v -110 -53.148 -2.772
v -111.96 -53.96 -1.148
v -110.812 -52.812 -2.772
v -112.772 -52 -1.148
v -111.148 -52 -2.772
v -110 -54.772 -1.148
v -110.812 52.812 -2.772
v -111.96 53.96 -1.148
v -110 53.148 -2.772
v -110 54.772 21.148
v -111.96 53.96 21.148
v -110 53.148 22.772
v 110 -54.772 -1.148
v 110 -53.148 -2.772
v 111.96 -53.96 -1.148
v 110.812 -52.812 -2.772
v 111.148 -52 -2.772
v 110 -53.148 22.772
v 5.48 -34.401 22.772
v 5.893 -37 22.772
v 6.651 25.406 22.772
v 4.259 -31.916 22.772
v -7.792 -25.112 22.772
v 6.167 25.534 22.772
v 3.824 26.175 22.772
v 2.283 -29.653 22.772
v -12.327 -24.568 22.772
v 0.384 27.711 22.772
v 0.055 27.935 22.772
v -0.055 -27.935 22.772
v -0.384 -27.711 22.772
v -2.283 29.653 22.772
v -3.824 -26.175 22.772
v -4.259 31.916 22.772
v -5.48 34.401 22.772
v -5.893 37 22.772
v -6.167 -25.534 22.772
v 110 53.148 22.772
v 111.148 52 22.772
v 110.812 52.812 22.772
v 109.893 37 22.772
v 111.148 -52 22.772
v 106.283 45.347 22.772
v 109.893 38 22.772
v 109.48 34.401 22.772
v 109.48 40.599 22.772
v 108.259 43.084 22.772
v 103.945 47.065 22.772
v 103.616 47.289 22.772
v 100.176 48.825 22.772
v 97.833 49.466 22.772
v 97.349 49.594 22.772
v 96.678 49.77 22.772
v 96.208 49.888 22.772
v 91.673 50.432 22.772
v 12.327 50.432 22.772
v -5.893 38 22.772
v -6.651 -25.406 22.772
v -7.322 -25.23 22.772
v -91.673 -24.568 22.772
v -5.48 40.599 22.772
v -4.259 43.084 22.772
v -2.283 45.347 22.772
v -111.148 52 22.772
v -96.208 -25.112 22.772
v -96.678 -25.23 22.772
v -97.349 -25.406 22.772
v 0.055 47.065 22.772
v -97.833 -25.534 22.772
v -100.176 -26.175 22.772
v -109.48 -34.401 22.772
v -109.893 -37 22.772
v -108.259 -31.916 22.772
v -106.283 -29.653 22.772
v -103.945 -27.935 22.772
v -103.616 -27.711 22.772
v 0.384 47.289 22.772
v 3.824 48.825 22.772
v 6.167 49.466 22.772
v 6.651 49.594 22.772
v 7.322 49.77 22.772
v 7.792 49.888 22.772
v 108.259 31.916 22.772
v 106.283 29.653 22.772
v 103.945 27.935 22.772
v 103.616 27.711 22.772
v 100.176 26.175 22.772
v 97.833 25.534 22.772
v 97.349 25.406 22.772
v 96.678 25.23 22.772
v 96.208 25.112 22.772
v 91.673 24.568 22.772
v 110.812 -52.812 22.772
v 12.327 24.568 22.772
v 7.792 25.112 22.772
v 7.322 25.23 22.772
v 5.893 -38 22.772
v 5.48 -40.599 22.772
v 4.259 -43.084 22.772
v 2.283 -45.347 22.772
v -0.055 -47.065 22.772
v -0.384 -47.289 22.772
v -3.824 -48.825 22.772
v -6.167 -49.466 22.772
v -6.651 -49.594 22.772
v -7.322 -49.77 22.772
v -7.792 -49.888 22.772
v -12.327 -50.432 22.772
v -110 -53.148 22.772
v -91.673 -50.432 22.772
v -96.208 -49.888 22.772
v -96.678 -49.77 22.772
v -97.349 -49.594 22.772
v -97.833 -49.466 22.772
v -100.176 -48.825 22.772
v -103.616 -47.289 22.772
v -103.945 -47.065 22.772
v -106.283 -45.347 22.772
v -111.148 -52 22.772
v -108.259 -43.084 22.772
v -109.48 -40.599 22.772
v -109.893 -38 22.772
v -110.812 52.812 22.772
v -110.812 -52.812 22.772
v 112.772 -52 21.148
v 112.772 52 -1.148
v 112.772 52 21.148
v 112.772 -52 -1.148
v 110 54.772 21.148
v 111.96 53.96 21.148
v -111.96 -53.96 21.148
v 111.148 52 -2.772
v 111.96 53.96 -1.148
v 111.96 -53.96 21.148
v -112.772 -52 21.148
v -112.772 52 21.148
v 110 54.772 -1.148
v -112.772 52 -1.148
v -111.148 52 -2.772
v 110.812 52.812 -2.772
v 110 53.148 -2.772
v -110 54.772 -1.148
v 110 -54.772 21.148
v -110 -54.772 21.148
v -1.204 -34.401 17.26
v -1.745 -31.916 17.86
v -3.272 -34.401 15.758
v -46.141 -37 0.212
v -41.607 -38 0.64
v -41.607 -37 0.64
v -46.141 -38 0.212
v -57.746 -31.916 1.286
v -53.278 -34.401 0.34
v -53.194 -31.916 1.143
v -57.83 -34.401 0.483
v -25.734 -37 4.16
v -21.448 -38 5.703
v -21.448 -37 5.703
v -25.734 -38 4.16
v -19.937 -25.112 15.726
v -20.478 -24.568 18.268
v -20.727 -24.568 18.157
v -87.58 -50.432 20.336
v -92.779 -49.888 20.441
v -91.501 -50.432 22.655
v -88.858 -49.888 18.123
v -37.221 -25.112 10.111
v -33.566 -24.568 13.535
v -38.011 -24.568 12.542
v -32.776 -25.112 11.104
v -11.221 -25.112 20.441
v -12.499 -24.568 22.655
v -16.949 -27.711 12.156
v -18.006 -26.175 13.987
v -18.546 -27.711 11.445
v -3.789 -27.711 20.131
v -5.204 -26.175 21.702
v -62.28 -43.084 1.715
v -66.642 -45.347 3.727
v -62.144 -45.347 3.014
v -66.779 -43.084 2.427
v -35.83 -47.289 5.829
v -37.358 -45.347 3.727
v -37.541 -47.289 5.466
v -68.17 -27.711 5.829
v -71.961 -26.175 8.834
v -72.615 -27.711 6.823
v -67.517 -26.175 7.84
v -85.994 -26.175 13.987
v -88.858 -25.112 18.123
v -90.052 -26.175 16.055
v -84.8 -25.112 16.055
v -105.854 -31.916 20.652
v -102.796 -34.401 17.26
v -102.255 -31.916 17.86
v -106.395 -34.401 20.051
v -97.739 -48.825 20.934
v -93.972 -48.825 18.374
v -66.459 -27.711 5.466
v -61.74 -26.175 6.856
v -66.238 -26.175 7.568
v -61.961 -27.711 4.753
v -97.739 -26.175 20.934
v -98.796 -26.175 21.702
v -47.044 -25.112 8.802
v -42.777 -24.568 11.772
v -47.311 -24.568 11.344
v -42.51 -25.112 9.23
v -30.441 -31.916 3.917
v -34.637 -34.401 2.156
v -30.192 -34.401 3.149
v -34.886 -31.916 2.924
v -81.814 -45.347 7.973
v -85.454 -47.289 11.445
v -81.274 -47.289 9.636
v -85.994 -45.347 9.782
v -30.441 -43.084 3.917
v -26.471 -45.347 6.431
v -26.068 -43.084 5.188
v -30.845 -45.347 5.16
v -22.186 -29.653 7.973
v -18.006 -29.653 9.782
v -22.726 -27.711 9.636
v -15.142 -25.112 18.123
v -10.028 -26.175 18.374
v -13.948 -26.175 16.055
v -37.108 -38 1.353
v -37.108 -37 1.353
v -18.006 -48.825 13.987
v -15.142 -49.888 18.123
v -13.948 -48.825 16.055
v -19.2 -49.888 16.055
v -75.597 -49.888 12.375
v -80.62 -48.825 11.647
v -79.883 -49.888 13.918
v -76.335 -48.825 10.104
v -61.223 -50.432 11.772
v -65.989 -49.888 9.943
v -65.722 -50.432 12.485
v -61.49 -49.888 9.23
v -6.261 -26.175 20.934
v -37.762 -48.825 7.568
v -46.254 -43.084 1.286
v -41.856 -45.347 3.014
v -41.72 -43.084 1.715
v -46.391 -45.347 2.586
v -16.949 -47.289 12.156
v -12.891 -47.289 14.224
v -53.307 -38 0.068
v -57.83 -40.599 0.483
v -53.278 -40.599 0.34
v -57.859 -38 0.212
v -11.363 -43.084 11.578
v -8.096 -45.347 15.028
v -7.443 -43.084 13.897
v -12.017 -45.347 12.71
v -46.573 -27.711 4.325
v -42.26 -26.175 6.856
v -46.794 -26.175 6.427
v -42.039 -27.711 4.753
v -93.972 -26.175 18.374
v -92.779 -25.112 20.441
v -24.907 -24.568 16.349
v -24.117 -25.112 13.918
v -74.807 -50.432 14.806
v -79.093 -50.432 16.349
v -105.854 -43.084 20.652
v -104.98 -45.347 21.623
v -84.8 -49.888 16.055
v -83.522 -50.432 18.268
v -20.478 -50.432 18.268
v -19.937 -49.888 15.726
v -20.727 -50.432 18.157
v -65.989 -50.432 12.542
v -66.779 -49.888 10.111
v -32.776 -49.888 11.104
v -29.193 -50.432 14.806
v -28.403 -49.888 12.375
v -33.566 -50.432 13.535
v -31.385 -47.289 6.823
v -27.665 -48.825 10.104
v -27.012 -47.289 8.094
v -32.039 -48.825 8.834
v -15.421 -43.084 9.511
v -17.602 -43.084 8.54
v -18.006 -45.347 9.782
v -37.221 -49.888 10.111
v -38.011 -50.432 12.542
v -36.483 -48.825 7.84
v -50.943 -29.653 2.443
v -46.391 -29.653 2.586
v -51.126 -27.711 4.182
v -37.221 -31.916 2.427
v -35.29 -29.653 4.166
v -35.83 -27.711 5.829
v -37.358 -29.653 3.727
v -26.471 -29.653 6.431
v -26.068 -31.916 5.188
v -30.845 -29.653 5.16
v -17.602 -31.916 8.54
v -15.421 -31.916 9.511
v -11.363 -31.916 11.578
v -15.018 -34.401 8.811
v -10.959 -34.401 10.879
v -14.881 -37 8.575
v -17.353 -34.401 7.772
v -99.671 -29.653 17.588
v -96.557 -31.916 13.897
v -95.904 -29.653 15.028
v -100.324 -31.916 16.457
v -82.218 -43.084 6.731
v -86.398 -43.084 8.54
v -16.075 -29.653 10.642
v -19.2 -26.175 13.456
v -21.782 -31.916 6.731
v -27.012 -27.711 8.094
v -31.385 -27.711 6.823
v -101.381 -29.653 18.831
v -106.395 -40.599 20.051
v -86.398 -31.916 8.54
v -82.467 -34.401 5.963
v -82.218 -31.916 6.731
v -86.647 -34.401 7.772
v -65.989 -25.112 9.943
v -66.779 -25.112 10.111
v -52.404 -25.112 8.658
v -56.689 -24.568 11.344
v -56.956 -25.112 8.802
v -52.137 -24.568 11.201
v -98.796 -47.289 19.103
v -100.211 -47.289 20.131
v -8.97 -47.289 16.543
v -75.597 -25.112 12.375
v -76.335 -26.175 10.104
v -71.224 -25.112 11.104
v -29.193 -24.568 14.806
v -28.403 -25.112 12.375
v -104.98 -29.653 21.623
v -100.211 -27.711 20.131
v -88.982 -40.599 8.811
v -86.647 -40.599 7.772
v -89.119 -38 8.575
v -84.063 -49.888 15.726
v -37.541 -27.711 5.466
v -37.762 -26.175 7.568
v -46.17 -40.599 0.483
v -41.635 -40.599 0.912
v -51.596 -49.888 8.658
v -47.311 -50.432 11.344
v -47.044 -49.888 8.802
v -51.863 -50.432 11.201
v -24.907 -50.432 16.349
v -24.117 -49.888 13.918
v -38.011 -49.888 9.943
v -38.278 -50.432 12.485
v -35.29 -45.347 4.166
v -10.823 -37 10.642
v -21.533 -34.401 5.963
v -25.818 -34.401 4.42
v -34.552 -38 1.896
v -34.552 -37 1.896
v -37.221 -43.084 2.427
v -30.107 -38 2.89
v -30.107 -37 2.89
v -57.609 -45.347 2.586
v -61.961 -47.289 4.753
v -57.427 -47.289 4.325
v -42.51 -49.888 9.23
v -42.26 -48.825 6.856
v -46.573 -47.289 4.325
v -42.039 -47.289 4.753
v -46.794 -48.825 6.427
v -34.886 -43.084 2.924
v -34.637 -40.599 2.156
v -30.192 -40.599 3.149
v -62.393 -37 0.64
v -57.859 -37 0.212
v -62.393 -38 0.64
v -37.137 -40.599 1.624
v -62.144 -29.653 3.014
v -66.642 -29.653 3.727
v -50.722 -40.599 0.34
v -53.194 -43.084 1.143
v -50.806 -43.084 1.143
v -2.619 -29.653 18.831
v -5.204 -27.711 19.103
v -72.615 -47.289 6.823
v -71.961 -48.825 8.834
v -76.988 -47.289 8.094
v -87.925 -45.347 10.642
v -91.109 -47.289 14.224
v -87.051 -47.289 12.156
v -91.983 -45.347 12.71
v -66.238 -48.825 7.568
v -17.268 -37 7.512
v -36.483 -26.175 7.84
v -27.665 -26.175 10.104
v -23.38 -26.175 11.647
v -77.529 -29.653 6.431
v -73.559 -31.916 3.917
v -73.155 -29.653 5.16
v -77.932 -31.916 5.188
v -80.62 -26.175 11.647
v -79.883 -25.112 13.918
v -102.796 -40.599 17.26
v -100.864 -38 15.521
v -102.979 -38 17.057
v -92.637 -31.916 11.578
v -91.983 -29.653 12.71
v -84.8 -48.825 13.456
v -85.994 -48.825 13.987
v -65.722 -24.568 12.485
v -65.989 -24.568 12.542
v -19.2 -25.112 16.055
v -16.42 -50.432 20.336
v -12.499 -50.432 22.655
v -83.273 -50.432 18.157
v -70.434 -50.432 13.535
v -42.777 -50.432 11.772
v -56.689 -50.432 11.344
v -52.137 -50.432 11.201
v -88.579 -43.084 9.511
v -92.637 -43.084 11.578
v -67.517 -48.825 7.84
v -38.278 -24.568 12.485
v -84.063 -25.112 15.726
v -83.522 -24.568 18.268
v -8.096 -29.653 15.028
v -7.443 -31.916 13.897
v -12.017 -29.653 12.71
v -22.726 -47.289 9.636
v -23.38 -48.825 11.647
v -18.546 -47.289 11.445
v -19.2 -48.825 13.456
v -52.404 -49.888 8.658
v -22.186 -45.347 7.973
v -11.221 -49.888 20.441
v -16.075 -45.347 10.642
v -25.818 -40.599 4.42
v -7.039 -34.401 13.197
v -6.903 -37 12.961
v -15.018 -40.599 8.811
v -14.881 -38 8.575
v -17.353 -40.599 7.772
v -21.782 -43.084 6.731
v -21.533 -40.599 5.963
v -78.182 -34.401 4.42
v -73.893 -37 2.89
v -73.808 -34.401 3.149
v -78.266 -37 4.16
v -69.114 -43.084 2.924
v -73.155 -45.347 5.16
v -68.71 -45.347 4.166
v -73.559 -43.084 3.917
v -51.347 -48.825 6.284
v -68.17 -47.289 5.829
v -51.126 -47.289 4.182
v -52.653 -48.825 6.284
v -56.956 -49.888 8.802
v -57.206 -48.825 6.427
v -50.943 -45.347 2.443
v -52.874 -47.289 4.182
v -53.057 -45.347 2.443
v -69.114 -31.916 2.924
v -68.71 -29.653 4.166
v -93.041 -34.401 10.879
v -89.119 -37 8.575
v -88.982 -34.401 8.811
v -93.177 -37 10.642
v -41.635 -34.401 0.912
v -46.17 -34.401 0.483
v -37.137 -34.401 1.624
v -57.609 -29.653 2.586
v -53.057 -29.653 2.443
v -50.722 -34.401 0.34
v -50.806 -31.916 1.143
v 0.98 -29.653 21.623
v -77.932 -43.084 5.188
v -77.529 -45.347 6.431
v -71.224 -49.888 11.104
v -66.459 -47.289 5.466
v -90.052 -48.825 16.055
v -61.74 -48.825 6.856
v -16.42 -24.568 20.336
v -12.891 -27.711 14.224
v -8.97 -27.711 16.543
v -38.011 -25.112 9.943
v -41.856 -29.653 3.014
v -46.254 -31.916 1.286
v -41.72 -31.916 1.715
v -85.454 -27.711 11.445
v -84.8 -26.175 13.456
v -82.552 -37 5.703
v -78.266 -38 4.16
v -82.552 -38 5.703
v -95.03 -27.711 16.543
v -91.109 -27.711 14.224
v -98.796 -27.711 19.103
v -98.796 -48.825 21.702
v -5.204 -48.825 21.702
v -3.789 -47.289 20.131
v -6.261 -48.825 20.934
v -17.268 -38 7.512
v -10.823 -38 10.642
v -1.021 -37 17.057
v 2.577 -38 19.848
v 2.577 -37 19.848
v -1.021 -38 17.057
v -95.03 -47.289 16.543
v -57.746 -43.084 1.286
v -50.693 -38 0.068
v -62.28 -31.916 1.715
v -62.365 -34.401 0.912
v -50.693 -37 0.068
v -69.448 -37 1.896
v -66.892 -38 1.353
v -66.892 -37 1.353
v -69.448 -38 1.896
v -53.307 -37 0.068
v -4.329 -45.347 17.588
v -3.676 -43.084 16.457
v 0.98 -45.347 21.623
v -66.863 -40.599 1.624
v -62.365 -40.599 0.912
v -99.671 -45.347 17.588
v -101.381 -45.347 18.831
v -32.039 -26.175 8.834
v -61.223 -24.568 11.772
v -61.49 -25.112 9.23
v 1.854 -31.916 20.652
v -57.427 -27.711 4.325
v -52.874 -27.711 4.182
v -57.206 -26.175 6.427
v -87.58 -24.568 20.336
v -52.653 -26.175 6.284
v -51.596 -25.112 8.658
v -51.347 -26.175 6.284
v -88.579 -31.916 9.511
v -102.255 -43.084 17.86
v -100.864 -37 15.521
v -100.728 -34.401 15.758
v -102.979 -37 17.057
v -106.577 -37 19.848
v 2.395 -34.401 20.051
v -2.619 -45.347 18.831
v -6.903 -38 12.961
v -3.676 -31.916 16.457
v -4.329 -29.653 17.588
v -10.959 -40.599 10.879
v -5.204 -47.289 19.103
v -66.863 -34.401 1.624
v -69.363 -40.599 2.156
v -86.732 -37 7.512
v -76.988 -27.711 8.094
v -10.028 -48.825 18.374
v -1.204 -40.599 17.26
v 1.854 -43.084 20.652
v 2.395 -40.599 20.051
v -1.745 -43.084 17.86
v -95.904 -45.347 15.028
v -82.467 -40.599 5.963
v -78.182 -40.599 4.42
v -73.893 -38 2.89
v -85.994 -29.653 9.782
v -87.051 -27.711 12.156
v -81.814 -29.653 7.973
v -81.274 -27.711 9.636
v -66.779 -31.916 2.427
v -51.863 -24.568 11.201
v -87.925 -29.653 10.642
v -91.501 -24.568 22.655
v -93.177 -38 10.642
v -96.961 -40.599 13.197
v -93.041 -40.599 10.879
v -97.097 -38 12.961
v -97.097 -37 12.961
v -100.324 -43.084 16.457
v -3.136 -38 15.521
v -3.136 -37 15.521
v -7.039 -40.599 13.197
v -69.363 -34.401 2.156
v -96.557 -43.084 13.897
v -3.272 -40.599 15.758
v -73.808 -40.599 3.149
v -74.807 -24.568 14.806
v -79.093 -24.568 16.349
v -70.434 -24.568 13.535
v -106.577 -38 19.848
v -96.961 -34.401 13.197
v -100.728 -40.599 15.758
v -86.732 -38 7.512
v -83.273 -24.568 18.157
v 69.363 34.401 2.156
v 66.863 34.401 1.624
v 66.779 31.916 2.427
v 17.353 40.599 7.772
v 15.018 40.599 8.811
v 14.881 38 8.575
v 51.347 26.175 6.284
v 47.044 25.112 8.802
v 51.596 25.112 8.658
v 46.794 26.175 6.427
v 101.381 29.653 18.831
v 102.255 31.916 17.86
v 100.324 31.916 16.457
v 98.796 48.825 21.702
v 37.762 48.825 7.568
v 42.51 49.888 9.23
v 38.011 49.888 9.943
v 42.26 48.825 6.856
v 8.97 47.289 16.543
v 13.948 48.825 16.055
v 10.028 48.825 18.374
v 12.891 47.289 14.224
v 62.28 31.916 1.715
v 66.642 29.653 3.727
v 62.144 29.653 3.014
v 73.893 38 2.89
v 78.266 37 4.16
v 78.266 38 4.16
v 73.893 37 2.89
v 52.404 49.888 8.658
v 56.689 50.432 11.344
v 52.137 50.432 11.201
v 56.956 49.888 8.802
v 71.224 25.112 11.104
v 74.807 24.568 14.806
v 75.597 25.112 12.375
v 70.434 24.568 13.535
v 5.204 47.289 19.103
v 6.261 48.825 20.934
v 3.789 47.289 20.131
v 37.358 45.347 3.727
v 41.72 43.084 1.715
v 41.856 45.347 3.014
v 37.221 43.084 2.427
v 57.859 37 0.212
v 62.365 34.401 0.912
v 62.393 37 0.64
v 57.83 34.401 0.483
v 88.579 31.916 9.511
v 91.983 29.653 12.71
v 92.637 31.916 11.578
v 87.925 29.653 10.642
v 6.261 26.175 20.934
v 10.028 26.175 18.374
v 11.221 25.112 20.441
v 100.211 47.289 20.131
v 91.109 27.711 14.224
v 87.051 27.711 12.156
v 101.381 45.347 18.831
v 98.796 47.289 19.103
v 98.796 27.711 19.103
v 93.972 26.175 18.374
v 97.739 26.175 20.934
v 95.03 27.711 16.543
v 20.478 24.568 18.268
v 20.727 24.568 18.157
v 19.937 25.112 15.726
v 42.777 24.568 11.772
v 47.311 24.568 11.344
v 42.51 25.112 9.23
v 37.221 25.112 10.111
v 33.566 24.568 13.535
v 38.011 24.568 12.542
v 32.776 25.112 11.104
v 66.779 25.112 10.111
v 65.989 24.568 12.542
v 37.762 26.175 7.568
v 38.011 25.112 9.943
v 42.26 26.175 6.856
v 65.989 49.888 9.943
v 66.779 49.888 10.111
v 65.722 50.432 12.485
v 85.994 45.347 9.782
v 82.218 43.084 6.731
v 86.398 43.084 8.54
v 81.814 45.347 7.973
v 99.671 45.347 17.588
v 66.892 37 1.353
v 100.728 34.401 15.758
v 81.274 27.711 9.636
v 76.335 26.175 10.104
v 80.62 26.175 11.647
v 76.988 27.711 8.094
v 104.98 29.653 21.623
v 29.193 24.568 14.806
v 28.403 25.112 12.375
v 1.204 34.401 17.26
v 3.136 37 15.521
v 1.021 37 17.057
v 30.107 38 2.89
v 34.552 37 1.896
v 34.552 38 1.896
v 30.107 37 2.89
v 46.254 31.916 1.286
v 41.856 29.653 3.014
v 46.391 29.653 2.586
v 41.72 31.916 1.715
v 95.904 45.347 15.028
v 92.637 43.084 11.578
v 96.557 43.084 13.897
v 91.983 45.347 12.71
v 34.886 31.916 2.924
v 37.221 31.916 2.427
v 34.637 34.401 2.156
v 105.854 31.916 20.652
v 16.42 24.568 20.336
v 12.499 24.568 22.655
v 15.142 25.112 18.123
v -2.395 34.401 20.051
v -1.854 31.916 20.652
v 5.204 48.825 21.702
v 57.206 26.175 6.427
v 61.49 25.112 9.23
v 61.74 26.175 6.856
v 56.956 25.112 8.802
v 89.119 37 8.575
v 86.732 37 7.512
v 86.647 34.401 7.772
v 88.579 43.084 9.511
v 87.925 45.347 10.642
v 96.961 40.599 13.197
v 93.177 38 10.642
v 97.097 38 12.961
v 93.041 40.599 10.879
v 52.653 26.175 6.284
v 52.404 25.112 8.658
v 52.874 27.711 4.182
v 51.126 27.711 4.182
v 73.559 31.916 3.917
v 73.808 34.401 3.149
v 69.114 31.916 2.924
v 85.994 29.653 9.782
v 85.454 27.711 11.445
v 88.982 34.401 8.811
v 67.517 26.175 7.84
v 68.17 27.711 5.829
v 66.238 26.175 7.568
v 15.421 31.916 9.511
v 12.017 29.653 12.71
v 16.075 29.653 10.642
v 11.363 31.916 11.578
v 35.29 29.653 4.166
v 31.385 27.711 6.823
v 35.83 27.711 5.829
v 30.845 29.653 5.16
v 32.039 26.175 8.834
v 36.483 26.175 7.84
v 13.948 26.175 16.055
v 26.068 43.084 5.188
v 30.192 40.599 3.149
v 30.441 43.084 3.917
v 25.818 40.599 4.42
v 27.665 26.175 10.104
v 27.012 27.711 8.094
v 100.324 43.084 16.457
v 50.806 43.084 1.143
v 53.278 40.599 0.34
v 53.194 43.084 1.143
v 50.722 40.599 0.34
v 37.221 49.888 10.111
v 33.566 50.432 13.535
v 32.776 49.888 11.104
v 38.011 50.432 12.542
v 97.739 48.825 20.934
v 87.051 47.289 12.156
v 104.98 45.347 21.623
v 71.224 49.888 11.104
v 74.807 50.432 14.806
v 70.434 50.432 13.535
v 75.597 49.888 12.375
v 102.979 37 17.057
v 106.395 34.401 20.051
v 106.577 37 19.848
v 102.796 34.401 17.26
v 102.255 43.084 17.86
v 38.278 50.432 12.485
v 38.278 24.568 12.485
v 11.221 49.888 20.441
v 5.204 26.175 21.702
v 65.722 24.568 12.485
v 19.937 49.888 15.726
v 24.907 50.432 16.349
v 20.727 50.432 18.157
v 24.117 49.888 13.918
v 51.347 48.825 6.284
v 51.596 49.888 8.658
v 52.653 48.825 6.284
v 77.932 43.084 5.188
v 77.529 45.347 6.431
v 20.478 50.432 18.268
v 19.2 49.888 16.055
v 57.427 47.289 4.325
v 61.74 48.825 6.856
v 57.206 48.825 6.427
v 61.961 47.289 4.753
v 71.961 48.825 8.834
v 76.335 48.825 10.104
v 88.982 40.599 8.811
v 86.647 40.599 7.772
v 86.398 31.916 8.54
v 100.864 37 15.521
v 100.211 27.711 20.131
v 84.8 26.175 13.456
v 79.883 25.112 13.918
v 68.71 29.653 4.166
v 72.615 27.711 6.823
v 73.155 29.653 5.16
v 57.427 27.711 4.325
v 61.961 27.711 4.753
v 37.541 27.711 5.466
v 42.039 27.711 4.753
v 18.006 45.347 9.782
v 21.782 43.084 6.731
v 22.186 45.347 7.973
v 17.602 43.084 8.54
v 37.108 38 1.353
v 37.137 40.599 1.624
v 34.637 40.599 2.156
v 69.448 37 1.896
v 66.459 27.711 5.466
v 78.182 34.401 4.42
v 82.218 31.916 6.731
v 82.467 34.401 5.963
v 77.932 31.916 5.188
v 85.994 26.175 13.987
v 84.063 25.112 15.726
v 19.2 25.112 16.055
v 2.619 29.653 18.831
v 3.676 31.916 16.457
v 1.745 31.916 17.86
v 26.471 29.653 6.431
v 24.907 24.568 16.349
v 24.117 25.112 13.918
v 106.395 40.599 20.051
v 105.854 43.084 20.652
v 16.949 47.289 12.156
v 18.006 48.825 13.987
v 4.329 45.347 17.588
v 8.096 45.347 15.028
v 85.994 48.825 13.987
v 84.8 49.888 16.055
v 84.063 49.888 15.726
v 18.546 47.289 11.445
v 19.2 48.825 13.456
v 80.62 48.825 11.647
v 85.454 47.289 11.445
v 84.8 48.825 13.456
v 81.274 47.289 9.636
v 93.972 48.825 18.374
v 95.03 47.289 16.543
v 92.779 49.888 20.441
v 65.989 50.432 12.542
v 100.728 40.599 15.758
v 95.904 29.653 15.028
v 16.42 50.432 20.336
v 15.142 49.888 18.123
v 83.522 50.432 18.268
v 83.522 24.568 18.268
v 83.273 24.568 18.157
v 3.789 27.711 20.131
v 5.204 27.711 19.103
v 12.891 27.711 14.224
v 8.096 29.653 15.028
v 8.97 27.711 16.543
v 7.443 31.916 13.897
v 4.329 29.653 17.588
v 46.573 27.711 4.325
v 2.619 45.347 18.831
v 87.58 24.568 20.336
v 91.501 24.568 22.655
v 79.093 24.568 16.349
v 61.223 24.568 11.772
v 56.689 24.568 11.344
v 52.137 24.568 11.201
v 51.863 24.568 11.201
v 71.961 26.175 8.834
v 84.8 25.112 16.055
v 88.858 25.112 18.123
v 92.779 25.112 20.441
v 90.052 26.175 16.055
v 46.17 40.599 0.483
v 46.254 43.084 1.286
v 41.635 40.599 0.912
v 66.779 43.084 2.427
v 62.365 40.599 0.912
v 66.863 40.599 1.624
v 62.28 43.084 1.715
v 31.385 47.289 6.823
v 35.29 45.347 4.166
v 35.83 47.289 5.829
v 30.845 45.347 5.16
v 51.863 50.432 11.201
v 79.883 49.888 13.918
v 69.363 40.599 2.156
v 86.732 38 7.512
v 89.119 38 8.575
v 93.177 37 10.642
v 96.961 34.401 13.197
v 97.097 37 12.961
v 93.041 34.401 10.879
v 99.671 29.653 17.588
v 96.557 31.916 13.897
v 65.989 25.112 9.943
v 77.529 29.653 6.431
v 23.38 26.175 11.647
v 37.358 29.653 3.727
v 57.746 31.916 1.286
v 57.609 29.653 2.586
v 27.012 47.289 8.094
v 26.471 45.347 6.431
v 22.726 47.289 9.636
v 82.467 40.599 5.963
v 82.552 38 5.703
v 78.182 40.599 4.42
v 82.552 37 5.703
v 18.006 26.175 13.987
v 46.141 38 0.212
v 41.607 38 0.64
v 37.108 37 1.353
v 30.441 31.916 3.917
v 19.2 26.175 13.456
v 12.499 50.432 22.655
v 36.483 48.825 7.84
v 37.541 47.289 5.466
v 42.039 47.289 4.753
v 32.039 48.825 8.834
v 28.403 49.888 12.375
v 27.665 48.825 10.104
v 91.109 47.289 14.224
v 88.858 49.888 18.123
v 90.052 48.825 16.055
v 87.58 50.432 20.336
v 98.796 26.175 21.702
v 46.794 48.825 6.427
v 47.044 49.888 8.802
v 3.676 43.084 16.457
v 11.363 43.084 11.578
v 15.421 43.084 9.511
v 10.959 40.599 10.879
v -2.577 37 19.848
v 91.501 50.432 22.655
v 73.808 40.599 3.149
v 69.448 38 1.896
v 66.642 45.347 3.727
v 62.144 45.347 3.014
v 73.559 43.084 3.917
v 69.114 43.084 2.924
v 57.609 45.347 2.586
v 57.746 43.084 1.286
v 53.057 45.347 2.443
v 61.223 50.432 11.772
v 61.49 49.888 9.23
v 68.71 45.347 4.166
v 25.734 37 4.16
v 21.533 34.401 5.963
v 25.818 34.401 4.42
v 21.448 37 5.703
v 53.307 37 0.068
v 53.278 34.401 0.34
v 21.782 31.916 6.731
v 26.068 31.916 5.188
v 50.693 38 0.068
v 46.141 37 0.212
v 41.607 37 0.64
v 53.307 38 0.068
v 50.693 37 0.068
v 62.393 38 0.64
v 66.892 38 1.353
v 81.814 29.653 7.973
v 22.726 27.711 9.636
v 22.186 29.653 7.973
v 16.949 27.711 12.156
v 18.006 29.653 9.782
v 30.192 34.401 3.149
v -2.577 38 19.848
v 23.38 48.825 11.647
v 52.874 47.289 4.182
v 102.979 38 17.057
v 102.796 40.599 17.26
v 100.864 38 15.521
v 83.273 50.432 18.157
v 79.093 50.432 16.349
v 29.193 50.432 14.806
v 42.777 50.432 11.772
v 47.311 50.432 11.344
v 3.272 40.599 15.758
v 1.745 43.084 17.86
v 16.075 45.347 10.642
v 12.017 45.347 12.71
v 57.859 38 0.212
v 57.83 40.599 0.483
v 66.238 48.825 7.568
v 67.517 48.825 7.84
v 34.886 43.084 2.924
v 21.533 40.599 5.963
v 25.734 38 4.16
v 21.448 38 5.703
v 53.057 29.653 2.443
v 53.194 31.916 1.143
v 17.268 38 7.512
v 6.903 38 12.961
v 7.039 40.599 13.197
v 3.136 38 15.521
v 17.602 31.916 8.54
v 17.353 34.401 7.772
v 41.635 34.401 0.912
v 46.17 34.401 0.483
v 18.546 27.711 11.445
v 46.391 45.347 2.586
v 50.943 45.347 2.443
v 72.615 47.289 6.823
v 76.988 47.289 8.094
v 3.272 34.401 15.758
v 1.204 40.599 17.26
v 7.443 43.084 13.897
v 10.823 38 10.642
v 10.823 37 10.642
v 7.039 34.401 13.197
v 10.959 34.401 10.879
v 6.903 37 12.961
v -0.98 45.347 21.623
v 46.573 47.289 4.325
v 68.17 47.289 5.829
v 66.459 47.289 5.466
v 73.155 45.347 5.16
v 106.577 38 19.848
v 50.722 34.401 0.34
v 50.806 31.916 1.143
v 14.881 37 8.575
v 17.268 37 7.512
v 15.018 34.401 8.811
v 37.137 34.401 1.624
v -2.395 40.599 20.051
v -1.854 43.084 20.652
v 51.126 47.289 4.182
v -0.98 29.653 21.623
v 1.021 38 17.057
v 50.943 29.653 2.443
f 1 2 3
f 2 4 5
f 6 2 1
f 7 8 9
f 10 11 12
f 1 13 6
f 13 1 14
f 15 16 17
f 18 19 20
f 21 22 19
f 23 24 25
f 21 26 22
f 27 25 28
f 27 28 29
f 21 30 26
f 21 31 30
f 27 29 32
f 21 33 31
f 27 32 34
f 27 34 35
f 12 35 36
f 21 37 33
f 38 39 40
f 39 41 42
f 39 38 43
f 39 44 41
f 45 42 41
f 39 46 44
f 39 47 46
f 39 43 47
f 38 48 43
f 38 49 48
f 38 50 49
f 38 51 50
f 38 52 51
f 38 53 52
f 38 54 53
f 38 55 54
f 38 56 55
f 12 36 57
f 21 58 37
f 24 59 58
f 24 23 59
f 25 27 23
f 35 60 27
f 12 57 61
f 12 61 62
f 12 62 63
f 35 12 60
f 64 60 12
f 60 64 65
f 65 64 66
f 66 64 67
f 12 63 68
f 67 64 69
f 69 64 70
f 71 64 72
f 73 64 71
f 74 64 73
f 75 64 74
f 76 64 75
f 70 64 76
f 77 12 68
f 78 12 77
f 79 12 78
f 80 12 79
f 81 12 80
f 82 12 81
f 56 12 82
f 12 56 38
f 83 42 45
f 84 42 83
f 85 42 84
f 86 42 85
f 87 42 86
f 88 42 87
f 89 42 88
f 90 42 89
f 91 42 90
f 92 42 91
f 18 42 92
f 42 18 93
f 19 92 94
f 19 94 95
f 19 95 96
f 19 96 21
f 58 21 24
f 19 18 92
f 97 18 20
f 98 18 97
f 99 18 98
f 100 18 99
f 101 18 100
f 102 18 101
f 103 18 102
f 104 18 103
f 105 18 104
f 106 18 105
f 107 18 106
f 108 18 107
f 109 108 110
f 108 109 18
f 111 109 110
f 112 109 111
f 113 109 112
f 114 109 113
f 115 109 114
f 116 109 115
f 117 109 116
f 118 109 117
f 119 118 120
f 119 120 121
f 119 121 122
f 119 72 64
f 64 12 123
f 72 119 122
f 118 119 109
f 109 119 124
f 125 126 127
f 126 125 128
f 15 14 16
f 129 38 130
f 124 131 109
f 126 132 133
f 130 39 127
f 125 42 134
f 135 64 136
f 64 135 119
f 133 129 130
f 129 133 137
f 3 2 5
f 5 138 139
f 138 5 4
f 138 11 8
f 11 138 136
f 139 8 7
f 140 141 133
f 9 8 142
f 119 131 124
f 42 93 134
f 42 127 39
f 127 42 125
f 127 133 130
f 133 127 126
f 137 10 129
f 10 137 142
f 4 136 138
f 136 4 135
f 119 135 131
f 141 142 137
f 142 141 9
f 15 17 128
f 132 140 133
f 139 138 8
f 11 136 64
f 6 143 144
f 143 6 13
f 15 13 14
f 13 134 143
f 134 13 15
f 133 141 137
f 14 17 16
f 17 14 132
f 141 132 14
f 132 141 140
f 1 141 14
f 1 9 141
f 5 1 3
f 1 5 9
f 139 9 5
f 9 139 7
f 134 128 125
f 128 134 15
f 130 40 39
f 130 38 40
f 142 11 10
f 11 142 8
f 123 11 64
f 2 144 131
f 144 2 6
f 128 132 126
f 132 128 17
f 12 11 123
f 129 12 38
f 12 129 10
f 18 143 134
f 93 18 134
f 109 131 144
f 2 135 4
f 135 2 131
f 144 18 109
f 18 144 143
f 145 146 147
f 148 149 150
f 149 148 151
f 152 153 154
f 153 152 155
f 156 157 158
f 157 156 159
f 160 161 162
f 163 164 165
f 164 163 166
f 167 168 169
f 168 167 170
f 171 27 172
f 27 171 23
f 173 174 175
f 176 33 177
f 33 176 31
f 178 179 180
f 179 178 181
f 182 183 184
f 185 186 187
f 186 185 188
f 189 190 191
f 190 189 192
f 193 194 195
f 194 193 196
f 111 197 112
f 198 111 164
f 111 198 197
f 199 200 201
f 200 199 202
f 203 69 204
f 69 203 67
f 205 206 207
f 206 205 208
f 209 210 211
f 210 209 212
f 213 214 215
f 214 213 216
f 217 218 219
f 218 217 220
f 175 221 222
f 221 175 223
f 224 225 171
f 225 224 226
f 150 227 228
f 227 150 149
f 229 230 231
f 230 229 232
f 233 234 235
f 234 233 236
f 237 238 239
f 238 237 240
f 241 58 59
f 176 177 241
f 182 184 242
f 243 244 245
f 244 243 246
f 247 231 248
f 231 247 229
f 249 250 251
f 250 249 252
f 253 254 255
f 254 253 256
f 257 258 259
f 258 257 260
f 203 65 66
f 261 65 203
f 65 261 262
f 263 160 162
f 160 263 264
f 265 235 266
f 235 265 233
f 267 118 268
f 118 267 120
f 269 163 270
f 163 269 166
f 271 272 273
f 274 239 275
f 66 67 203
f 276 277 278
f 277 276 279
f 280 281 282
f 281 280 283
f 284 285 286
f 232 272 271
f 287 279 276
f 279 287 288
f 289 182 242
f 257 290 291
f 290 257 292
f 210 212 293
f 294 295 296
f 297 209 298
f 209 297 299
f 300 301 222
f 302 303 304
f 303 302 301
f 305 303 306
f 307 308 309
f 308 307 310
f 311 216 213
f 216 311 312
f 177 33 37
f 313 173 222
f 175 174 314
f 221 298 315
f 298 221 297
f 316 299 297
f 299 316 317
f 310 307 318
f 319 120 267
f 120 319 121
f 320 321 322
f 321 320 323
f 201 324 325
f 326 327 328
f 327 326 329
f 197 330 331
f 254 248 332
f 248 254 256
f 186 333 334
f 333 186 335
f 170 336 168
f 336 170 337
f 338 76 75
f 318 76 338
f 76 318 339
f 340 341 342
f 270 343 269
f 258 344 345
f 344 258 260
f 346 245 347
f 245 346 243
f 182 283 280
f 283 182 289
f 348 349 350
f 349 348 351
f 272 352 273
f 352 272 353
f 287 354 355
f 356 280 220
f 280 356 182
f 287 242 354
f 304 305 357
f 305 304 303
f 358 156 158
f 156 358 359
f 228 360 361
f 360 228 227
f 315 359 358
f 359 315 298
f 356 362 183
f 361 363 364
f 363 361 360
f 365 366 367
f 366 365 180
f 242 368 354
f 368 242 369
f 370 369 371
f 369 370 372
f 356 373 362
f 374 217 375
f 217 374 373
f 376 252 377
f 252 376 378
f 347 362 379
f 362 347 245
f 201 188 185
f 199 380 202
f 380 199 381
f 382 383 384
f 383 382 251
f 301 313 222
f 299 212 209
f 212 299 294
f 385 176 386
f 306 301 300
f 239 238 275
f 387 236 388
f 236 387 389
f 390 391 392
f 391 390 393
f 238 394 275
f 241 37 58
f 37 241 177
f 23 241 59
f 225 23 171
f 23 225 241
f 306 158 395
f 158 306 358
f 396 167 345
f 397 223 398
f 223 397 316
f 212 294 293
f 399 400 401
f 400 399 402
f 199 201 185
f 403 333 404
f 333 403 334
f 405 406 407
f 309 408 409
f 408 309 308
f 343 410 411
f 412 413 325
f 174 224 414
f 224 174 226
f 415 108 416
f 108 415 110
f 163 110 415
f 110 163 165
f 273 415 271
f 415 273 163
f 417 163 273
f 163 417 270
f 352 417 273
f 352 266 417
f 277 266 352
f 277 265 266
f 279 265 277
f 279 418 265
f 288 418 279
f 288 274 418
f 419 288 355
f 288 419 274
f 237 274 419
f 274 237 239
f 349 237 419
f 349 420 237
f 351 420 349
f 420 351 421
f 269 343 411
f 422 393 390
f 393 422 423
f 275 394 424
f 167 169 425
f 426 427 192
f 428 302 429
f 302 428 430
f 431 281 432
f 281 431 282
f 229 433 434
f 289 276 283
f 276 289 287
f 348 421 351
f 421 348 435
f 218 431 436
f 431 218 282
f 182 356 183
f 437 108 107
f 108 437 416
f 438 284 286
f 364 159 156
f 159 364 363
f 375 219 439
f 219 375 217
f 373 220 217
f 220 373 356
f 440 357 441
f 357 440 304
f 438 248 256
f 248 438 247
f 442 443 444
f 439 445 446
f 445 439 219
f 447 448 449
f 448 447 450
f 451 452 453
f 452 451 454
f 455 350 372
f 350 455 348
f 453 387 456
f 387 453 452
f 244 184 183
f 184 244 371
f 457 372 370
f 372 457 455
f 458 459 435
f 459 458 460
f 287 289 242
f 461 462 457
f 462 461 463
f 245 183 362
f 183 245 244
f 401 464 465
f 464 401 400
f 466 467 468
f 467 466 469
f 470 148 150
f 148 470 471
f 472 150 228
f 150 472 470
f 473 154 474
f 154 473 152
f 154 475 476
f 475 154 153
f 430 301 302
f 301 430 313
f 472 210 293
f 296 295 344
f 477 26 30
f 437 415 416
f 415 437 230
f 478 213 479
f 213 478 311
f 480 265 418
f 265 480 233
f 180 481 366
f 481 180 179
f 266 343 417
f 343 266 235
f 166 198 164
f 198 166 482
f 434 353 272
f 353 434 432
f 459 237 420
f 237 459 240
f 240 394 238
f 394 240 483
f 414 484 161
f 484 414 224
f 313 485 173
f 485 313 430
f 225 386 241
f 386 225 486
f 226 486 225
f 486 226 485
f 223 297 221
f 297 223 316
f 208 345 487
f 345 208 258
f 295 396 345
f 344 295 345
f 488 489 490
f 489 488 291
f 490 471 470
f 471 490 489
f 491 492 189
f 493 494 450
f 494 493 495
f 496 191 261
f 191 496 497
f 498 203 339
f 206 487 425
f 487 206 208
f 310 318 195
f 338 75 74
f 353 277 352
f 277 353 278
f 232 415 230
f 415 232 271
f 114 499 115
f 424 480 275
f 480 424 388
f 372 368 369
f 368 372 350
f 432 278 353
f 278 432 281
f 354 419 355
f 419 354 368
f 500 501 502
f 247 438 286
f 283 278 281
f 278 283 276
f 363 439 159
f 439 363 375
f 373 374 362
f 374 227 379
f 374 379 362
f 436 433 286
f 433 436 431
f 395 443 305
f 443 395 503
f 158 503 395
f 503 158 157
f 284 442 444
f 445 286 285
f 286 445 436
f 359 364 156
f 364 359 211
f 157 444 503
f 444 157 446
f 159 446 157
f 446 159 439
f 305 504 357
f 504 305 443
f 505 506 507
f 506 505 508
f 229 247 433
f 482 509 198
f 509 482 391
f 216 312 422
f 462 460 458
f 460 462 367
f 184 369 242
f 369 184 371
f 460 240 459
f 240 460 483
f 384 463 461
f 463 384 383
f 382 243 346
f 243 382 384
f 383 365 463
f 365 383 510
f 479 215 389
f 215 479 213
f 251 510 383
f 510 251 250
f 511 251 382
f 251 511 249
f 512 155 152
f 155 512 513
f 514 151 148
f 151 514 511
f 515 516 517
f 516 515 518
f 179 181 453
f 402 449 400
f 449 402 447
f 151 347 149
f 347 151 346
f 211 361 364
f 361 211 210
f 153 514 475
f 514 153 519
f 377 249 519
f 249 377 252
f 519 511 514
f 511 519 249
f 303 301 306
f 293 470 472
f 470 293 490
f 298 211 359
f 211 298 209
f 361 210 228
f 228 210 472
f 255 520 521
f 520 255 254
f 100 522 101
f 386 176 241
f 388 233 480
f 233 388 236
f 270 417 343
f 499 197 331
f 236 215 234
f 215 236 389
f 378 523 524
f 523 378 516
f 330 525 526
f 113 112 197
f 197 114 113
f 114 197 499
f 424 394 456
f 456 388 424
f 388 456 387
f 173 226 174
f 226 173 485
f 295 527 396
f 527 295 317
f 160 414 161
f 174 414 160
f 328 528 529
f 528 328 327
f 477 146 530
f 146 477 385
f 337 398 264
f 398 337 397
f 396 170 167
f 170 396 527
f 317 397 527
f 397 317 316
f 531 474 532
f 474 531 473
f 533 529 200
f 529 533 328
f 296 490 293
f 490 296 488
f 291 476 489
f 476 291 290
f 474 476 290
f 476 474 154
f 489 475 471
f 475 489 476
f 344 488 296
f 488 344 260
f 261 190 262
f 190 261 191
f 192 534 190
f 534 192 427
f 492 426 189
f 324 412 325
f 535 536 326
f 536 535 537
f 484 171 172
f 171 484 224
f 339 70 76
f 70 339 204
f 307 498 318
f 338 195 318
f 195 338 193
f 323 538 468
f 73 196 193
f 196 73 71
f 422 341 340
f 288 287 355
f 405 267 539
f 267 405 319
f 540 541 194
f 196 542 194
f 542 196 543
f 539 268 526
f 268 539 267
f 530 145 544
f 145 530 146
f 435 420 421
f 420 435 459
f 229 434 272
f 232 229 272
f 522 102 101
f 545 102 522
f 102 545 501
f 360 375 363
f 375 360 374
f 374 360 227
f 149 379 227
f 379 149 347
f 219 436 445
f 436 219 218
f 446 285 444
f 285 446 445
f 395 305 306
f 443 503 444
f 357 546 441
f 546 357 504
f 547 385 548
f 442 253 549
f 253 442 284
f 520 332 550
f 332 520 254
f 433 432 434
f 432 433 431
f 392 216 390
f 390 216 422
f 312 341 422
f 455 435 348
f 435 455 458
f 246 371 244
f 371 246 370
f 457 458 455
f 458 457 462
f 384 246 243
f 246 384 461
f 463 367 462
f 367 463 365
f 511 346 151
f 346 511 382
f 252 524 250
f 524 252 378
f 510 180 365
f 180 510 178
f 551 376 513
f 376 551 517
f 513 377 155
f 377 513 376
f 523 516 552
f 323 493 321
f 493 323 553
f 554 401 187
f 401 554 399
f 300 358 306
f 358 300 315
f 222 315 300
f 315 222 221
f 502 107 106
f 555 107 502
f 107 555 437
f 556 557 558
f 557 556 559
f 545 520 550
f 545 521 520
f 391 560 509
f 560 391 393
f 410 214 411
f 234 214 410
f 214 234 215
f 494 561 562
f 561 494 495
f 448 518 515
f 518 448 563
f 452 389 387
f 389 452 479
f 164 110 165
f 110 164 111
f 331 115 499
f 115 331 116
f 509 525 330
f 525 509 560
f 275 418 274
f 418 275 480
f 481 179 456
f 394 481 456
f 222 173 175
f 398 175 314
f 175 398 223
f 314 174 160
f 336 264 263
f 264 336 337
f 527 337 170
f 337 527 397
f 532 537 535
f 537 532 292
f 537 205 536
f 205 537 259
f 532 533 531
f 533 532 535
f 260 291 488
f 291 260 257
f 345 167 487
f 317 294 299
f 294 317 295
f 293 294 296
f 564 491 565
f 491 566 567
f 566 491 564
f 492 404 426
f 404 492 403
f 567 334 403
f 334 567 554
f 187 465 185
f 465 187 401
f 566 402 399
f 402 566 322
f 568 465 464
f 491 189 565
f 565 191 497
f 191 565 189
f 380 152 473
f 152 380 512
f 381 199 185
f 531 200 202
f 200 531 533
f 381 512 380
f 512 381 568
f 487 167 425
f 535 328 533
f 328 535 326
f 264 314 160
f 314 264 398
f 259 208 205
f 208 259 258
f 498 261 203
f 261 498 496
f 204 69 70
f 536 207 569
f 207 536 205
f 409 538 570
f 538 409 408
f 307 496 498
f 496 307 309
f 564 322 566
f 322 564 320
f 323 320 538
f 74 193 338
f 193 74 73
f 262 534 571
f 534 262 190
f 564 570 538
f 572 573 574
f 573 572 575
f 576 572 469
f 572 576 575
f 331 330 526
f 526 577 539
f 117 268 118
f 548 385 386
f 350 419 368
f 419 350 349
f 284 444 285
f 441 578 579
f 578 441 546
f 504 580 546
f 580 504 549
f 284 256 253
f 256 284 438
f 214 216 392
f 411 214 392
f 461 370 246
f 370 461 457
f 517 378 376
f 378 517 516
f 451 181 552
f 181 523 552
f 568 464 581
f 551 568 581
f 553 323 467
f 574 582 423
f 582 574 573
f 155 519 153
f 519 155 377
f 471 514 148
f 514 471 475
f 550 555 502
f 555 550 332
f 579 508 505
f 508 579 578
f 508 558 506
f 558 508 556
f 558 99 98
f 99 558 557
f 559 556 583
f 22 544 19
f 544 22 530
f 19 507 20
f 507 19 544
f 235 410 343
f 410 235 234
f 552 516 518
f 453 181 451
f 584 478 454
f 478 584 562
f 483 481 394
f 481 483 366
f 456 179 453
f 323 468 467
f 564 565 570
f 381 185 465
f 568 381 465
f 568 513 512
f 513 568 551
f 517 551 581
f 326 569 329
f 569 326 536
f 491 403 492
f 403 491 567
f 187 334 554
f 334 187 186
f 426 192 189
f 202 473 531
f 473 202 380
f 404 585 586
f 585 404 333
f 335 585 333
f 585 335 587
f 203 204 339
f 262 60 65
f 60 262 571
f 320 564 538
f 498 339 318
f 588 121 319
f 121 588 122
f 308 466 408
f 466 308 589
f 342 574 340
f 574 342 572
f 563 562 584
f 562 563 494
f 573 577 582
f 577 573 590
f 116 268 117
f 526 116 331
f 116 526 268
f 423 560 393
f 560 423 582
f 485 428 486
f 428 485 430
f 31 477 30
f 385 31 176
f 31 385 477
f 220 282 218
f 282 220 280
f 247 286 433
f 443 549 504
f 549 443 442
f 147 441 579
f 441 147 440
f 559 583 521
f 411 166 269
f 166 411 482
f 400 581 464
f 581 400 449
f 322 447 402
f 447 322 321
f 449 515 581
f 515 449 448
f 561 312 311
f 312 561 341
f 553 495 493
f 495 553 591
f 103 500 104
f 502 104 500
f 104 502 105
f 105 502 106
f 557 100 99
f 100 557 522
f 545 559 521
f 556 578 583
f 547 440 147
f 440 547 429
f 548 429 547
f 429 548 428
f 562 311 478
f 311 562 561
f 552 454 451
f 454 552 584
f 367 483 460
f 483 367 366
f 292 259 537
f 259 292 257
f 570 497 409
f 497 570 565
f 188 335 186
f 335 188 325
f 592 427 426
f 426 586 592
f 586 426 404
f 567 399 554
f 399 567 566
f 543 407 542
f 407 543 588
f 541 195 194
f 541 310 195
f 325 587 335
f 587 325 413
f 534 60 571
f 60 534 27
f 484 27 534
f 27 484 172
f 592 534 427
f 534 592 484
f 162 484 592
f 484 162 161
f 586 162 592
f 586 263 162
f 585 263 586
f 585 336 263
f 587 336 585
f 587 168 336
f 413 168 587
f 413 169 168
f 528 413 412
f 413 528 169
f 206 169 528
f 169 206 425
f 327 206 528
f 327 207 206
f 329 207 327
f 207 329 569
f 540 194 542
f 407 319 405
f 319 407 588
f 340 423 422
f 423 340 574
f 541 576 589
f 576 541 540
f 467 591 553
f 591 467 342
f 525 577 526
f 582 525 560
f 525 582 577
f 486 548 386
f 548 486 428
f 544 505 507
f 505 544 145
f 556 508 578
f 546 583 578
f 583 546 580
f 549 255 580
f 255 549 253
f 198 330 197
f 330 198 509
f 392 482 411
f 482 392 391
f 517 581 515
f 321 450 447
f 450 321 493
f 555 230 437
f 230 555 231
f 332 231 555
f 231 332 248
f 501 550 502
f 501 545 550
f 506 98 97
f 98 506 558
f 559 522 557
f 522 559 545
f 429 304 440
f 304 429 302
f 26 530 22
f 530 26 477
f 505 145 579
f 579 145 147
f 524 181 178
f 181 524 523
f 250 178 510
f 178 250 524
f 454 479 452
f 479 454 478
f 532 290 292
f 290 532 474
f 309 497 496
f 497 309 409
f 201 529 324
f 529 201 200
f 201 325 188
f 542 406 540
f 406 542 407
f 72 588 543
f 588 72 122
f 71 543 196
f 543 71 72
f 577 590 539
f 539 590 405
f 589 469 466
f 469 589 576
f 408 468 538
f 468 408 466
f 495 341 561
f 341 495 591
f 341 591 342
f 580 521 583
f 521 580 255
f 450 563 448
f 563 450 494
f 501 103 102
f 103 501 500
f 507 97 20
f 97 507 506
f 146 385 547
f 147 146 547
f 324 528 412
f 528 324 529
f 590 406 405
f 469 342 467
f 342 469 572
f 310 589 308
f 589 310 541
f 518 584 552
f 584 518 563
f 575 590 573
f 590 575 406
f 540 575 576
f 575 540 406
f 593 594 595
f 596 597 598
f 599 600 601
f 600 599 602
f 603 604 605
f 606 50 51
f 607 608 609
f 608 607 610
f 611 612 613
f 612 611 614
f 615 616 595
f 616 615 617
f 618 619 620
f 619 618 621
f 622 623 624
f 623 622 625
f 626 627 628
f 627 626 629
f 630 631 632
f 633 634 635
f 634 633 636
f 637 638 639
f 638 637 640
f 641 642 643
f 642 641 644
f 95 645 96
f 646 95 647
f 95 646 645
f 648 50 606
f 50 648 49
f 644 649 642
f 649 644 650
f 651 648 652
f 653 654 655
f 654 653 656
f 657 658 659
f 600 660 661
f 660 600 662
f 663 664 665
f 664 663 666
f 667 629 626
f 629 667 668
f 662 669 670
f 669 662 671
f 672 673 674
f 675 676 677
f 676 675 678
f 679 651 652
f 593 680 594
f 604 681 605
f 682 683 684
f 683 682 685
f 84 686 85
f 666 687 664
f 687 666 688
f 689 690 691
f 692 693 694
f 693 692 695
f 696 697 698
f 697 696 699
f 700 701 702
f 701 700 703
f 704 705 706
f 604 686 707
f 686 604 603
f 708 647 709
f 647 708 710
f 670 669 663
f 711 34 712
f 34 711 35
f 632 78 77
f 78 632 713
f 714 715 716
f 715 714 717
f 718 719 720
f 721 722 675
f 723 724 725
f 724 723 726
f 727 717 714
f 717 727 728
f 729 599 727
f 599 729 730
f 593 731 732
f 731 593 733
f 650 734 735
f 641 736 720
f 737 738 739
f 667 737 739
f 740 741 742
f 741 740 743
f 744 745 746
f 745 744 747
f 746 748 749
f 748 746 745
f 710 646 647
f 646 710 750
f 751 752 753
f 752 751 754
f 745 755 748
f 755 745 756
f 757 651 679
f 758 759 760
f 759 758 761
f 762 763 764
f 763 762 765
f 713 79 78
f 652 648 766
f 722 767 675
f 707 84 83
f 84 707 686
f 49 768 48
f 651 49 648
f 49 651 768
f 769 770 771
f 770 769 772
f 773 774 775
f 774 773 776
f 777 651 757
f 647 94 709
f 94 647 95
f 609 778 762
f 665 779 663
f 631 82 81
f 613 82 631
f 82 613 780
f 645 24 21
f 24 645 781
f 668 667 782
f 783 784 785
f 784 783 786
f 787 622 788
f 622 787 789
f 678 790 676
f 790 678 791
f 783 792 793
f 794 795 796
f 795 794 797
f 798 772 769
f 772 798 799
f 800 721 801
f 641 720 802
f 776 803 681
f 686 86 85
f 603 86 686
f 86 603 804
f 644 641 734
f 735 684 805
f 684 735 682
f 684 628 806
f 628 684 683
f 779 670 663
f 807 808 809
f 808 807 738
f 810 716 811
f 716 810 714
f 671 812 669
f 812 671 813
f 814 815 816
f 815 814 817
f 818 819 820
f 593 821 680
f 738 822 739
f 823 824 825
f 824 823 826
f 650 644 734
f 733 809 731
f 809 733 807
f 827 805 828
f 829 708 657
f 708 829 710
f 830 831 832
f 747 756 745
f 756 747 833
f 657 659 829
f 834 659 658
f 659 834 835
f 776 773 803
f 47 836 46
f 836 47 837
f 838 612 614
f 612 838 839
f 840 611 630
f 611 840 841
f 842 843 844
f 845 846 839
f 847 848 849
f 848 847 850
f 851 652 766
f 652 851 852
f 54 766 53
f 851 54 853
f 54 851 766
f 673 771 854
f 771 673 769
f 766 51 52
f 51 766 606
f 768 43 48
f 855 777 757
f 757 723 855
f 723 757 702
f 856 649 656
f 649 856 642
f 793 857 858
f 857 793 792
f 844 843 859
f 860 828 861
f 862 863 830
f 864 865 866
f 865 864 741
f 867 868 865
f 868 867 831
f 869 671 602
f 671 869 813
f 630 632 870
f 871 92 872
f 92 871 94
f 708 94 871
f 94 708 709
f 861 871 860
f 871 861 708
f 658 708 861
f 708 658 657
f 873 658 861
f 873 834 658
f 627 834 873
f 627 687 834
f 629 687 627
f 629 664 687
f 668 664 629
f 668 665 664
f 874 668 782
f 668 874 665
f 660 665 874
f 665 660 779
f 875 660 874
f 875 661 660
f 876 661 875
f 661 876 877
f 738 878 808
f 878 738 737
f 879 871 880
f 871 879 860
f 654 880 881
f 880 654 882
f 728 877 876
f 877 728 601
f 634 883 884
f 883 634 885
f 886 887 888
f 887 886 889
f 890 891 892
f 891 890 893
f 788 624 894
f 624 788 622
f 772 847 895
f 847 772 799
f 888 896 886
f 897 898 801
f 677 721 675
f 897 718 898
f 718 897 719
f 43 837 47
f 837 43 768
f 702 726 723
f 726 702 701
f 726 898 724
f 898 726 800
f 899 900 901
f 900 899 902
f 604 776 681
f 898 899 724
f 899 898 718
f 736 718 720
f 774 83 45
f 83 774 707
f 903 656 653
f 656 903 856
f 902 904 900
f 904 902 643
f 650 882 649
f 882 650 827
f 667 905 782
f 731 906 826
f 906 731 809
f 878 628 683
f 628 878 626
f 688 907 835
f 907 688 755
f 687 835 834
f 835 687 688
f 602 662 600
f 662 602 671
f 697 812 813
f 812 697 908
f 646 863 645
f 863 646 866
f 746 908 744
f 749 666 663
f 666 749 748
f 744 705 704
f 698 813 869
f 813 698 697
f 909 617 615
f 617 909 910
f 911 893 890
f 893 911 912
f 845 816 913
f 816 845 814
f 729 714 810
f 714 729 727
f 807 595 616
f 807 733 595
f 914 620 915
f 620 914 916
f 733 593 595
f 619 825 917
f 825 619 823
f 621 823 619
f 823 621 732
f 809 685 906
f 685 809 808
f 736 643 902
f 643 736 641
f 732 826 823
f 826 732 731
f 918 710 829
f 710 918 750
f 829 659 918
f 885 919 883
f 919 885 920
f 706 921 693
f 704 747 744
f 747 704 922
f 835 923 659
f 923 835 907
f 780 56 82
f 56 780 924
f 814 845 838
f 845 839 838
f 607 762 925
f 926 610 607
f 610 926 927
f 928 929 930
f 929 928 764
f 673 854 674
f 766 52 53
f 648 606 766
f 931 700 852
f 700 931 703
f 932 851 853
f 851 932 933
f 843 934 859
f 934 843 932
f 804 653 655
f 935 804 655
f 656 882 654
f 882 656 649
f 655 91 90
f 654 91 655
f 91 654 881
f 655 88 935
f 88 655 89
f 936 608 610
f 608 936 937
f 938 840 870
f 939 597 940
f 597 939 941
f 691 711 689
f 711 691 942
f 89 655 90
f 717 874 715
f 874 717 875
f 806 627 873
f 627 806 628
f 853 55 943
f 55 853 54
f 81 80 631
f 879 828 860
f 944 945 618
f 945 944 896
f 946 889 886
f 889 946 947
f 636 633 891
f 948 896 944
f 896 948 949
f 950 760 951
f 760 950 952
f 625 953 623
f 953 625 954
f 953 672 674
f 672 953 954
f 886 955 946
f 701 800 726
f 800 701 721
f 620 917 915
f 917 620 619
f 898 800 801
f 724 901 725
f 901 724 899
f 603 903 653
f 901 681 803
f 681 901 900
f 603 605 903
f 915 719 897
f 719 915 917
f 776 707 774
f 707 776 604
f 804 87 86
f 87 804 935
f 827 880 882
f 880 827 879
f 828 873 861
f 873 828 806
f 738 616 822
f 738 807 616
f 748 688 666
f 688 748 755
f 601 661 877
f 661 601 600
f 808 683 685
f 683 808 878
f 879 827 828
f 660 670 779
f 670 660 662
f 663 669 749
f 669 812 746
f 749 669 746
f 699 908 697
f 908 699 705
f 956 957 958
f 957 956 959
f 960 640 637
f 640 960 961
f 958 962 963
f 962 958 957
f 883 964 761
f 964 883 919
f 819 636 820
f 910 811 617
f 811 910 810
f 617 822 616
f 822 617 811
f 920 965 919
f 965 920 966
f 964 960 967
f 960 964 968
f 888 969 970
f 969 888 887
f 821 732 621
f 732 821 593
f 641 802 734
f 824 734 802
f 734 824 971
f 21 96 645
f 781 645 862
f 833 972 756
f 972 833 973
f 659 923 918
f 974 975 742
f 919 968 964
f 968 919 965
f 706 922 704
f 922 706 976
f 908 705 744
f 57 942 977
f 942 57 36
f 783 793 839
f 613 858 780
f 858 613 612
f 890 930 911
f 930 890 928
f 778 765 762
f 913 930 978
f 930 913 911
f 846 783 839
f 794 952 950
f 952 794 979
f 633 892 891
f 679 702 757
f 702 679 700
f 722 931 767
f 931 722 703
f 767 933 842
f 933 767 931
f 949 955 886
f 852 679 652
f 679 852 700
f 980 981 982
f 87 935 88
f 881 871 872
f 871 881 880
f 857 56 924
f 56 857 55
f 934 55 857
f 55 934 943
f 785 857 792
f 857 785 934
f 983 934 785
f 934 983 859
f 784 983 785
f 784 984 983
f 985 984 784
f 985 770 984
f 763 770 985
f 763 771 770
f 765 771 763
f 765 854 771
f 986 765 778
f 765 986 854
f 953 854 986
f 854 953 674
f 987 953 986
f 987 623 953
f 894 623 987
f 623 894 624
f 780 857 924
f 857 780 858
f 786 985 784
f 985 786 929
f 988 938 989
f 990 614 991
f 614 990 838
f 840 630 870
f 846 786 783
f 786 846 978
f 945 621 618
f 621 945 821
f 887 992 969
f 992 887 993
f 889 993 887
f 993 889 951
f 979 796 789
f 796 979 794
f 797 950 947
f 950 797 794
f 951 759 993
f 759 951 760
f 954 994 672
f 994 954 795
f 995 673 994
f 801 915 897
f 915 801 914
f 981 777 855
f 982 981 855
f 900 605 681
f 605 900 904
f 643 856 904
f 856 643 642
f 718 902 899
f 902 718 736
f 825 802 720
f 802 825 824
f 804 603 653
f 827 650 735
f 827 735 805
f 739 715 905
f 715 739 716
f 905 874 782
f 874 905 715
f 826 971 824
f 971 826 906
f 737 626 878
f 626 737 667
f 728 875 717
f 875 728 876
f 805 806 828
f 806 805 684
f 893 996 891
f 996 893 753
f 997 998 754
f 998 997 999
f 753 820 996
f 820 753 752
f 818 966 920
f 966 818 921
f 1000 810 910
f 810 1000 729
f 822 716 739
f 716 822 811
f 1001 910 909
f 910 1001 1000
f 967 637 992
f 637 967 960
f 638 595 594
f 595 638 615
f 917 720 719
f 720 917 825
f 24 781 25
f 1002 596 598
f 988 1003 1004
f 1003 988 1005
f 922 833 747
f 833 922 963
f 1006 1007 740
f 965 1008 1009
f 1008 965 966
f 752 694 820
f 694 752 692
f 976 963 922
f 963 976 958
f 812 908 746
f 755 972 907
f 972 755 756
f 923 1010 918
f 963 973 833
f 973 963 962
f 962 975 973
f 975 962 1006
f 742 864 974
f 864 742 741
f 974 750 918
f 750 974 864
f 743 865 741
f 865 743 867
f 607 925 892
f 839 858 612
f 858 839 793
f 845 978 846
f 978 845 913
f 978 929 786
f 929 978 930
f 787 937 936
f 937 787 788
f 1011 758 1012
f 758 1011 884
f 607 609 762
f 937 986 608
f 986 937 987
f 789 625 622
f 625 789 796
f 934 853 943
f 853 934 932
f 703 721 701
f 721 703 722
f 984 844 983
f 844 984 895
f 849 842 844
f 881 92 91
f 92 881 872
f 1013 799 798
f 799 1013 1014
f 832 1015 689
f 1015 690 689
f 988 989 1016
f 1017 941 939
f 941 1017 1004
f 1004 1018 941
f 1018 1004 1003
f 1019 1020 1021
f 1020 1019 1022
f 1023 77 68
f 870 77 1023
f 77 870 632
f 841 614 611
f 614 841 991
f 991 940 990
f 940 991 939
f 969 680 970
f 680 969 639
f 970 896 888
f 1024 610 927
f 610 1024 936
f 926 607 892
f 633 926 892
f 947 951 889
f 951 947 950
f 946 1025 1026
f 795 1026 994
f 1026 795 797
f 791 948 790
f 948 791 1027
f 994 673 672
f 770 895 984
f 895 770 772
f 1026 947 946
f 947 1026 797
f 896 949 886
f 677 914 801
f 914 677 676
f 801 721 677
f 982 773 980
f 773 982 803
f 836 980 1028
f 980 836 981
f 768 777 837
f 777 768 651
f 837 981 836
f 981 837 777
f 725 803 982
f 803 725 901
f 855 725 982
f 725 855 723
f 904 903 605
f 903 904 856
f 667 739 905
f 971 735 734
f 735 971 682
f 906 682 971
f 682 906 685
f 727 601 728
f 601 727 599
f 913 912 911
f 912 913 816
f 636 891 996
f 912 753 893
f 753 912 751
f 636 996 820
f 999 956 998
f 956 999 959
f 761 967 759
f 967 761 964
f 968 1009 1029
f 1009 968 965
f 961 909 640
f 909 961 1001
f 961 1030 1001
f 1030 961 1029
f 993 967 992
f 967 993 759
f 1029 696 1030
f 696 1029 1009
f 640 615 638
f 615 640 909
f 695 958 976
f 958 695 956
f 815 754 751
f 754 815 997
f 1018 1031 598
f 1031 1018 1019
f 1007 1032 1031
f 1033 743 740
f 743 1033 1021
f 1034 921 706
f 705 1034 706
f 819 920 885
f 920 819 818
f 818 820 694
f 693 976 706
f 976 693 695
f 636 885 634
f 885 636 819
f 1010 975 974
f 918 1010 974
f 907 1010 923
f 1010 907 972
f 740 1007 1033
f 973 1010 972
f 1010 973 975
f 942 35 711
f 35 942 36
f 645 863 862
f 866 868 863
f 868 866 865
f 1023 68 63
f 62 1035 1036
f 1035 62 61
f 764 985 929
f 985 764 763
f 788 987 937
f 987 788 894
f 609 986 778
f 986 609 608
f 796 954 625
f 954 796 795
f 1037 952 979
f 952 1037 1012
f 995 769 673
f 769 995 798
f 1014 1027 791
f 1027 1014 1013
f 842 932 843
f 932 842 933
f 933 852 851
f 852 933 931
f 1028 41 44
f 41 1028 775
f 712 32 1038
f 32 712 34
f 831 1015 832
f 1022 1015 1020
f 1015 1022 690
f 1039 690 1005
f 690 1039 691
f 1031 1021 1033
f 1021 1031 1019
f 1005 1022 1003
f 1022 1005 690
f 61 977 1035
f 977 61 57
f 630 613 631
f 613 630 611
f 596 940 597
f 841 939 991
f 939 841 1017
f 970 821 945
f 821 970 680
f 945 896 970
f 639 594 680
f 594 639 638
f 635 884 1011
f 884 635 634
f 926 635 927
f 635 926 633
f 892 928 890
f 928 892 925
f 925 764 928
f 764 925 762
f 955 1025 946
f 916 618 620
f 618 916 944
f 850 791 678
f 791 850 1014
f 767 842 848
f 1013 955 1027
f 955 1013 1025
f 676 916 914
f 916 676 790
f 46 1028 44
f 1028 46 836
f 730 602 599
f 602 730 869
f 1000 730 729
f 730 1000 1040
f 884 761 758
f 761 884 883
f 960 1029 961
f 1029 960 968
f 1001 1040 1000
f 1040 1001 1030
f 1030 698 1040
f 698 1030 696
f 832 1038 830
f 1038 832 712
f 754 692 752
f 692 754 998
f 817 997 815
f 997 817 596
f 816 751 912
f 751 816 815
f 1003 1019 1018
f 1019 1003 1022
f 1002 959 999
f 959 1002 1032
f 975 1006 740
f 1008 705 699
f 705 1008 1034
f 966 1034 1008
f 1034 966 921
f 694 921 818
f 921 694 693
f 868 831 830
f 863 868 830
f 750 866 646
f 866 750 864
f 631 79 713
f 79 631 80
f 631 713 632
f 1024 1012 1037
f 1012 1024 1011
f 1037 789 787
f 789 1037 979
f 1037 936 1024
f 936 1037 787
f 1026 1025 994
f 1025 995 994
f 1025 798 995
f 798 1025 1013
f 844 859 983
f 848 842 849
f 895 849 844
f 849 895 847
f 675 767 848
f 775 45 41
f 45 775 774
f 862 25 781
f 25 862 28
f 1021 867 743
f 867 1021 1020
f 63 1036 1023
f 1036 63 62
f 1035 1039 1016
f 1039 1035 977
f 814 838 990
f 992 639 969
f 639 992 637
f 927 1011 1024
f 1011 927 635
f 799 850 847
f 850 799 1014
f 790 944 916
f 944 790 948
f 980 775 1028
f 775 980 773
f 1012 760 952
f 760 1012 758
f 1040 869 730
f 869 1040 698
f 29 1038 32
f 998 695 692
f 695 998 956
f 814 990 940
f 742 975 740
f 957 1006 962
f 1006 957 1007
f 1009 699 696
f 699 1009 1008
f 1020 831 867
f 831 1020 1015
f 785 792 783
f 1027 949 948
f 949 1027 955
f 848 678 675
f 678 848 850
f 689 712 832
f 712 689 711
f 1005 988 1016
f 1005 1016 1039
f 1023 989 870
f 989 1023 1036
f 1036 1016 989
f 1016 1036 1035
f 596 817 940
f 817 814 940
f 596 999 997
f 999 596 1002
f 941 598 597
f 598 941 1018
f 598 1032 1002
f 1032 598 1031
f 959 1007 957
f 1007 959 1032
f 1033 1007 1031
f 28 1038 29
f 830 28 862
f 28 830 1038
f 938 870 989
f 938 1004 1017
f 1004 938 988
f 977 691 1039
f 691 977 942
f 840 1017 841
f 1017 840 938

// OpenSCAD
r_c=145/2;
r_s=25/2;
r_w=r_c+r_s;
r_m=15;
min_delta=3;

module main_mass() {
    minkowski() {
        translate([0,0,10]) cube([220, 8*r_s+4, 20], center=true);
        sphere(r=3, $fn=8);
    }
}

module hole() {
    t_y=r_w;
    
    union() {
        translate([0,0,t_y]) rotate([90,0,0]) union() {        
            minkowski() {
                cylinder(r=r_c, h=1, center=true, $fn=100);
                sphere(r=r_s);
            }
            
            /*
            hull() {
                cylinder(r=r_c-20, h=1, center=true, $fn=100);
                sphere(r=r_s+4);
            }
            */
        }
    }
}

difference() {
    main_mass();
    translate([-(r_w + r_m)/2 - 2, -3*r_s, 0]) hole();
    translate([(r_w + r_m)/2 + 2, 3*r_s, 0]) hole();
}
